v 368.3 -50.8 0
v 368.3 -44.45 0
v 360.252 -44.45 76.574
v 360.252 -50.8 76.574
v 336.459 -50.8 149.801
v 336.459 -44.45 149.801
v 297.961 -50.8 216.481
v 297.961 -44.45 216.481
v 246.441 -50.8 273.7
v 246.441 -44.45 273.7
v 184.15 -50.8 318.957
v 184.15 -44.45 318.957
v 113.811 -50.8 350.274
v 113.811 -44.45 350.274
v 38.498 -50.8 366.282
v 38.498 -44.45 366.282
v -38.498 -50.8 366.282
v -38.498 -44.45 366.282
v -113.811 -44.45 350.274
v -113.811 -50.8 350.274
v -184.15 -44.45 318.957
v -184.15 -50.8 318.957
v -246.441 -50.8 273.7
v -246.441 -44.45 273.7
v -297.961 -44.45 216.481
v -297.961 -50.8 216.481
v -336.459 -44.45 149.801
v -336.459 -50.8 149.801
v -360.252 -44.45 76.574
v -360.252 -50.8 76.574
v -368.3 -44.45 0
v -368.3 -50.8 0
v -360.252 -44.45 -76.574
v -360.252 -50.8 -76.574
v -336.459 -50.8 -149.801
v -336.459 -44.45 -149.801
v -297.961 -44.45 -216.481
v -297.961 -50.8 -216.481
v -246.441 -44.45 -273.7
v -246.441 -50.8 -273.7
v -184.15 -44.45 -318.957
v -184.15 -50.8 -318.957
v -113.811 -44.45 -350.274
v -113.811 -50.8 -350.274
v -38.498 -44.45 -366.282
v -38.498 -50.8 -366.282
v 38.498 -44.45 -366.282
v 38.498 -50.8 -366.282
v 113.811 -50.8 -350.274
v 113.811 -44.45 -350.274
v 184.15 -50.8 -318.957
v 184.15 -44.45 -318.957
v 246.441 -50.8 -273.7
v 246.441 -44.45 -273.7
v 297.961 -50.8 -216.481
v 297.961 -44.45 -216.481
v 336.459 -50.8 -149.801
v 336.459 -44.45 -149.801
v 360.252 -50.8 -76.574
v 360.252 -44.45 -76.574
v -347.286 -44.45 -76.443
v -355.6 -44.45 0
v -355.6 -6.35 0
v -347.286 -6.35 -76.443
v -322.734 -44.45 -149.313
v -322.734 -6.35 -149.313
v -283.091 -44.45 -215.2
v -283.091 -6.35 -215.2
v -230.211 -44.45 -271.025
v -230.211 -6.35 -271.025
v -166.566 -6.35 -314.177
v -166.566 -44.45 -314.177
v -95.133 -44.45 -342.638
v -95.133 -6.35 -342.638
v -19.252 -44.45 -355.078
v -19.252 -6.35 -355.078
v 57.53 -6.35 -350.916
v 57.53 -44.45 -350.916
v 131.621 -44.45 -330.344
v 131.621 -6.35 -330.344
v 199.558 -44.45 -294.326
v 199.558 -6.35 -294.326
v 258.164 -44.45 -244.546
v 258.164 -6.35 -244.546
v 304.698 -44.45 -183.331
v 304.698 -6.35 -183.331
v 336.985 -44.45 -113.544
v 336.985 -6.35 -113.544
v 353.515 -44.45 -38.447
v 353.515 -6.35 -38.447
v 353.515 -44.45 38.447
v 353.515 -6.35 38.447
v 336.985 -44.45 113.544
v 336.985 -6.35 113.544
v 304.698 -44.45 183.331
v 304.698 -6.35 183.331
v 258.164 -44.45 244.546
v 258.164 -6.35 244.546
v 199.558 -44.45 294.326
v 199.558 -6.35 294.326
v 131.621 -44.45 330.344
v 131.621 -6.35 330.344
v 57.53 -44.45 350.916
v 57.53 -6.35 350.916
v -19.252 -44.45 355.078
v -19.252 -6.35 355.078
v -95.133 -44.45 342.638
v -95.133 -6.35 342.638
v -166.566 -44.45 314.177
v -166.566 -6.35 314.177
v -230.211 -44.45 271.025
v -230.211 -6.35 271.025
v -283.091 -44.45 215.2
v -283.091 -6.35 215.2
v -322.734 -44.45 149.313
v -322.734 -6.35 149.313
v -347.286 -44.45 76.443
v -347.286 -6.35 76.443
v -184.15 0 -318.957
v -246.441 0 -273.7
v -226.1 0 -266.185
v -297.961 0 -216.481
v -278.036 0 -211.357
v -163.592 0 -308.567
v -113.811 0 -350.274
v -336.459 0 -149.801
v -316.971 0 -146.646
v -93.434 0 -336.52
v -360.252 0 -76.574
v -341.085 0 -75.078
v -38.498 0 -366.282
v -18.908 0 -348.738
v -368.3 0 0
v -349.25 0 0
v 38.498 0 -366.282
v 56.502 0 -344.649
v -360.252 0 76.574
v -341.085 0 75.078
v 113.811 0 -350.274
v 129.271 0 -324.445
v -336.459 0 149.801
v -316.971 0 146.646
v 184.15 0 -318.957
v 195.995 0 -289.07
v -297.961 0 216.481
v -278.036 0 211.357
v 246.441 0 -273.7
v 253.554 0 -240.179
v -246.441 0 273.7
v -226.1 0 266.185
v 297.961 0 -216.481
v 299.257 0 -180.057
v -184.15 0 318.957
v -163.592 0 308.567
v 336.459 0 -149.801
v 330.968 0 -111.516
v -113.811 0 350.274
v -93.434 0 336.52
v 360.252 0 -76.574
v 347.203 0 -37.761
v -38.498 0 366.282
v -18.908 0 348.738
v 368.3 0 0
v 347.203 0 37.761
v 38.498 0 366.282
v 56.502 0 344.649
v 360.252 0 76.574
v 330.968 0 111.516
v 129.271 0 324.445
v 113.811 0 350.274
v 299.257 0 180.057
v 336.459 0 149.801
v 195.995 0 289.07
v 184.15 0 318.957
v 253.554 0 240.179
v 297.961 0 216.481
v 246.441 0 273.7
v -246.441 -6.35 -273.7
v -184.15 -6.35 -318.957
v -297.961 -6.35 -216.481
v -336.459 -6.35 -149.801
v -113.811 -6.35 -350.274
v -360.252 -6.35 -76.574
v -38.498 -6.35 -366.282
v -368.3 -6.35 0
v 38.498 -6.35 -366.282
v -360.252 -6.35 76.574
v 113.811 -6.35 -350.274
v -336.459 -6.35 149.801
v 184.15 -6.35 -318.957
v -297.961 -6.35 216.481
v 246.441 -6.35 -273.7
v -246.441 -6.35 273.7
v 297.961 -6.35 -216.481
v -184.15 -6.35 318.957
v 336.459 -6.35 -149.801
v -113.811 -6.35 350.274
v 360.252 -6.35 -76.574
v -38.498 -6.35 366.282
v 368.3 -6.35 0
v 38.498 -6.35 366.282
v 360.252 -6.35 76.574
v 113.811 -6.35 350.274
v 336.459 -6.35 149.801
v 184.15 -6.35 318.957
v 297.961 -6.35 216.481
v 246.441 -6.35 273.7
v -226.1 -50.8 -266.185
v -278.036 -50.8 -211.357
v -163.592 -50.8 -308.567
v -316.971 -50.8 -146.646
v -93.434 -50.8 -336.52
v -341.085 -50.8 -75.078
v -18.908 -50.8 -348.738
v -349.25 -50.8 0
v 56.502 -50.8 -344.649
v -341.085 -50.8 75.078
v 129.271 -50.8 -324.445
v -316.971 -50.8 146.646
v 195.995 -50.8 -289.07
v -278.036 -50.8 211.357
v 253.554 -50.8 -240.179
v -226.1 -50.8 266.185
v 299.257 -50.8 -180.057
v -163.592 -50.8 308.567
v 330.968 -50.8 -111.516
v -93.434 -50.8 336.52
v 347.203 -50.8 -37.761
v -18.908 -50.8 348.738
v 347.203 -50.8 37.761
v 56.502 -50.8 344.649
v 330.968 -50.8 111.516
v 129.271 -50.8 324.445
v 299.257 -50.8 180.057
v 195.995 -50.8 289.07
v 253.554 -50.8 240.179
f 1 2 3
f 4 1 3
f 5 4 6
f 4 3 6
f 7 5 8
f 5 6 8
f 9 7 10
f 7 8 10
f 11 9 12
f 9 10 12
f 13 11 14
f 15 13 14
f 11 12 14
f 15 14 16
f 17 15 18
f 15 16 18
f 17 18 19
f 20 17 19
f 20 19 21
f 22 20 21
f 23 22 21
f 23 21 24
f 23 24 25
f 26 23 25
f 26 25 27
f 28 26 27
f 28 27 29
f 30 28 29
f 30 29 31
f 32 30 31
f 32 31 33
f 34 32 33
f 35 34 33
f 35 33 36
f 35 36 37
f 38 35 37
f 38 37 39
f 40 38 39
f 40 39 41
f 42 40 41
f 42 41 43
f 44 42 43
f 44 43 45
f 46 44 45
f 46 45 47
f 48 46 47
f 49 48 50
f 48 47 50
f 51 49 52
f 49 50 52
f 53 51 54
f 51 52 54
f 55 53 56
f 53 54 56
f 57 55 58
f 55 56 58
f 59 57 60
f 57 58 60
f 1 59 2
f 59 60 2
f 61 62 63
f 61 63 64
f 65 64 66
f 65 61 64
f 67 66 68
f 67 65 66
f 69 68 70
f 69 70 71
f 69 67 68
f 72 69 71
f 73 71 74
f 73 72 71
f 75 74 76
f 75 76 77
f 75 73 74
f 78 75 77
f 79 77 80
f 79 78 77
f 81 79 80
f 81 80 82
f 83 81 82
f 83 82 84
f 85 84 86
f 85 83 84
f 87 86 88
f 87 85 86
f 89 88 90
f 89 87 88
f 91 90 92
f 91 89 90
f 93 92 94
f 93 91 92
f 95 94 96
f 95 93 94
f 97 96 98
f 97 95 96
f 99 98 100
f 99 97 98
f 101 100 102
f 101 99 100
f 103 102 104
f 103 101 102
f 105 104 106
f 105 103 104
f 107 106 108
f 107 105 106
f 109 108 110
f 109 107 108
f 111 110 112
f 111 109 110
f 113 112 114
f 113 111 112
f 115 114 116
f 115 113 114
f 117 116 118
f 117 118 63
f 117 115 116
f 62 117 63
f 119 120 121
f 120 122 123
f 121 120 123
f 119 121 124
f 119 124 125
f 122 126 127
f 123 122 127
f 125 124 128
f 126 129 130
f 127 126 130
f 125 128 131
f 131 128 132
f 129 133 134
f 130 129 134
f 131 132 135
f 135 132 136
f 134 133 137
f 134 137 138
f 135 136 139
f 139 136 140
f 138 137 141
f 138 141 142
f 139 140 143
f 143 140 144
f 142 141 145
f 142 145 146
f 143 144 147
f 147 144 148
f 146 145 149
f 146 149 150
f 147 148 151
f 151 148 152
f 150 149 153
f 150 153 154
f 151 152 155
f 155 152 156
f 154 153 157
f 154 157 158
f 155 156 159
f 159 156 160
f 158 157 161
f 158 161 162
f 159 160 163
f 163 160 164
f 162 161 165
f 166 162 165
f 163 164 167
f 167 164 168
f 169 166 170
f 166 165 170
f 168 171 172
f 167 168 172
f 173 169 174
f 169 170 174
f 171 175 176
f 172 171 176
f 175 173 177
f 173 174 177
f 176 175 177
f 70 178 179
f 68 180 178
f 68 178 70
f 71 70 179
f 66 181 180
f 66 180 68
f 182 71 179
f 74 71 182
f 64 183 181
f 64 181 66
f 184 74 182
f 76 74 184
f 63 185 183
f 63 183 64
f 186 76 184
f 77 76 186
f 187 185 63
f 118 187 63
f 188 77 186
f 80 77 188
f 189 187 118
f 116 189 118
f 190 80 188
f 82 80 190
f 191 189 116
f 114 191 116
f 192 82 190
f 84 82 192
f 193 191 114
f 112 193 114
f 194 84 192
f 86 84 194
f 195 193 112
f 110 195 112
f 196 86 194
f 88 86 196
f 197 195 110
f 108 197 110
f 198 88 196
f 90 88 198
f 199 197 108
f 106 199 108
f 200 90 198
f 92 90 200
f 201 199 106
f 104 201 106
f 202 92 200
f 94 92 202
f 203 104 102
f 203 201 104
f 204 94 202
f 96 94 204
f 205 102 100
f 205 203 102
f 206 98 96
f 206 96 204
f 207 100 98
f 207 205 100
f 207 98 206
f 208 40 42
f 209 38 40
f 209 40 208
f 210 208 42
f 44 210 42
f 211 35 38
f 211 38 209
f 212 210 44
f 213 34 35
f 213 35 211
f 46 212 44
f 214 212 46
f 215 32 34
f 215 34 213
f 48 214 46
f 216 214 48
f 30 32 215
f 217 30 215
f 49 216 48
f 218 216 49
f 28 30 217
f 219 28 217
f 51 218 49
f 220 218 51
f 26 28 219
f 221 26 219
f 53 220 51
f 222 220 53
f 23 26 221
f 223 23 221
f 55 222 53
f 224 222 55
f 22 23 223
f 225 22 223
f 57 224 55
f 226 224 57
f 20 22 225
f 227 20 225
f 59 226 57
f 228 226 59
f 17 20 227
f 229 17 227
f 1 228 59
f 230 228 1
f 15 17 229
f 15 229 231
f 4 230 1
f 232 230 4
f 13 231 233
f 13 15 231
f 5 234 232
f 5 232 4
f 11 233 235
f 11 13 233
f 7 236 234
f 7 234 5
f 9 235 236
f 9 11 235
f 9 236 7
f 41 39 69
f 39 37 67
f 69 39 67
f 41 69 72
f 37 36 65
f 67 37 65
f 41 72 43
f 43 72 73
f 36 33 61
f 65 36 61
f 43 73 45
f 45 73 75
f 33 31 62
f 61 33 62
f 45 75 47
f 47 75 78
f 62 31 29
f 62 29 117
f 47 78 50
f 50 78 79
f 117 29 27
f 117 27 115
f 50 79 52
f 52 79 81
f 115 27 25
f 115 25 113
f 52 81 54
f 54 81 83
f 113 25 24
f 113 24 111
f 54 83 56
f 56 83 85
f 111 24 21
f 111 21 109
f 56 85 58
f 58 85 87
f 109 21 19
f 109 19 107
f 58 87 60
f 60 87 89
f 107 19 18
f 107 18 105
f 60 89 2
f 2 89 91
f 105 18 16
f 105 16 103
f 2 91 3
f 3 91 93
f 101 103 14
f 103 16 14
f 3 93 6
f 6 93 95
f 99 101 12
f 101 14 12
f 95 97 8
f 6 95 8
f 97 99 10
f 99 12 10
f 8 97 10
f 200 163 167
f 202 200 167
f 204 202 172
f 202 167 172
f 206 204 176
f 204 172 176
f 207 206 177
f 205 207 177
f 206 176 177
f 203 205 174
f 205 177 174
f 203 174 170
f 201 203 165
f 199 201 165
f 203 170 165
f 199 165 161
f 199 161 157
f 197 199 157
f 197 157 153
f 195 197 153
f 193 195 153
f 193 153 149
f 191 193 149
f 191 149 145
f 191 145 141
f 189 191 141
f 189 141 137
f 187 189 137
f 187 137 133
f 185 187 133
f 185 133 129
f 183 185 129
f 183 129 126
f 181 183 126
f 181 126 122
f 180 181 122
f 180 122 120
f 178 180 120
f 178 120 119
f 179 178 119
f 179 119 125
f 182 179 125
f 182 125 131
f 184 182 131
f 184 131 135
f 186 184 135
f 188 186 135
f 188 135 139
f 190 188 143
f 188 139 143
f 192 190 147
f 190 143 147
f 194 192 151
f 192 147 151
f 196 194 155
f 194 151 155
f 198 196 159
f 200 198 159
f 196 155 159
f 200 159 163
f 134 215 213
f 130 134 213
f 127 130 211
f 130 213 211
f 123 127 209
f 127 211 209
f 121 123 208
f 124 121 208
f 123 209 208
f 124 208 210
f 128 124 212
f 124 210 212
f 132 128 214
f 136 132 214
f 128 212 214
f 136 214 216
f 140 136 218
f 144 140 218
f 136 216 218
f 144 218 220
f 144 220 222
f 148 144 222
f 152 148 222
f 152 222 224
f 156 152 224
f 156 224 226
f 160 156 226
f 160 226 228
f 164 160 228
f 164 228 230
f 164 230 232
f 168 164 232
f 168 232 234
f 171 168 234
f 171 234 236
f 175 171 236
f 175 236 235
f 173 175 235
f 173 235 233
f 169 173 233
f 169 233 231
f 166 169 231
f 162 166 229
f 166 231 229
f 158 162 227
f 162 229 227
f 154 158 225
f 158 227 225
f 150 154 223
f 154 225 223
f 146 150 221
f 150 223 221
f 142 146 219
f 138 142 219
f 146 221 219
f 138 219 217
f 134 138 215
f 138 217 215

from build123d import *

# Parameters (mm, degrees)
F0_R     = 368.3
F1_DEPTH = 50.8
F2_D     = 698.5
F3_T     = -6.35


with BuildPart() as f1:
    # F0 (on Front) → F1 (new body)
    with BuildSketch(Plane.XZ):
        Circle(F0_R)
    extrude(amount=F1_DEPTH)

    # F2 (through all)
    with Locations(Plane(origin=(0, 0, 0), x_dir=(1, 0, 0), z_dir=(0, 1, 0))):
        with Locations((0, 0)):
            Hole(F2_D / 2)

    # F3
    f3_openings = [f1.faces().sort_by_distance(p)[0] for p in [
        (-368.3, -25.4, 0),
    ]]
    offset(amount=F3_T, openings=f3_openings)


solid = f1.part
